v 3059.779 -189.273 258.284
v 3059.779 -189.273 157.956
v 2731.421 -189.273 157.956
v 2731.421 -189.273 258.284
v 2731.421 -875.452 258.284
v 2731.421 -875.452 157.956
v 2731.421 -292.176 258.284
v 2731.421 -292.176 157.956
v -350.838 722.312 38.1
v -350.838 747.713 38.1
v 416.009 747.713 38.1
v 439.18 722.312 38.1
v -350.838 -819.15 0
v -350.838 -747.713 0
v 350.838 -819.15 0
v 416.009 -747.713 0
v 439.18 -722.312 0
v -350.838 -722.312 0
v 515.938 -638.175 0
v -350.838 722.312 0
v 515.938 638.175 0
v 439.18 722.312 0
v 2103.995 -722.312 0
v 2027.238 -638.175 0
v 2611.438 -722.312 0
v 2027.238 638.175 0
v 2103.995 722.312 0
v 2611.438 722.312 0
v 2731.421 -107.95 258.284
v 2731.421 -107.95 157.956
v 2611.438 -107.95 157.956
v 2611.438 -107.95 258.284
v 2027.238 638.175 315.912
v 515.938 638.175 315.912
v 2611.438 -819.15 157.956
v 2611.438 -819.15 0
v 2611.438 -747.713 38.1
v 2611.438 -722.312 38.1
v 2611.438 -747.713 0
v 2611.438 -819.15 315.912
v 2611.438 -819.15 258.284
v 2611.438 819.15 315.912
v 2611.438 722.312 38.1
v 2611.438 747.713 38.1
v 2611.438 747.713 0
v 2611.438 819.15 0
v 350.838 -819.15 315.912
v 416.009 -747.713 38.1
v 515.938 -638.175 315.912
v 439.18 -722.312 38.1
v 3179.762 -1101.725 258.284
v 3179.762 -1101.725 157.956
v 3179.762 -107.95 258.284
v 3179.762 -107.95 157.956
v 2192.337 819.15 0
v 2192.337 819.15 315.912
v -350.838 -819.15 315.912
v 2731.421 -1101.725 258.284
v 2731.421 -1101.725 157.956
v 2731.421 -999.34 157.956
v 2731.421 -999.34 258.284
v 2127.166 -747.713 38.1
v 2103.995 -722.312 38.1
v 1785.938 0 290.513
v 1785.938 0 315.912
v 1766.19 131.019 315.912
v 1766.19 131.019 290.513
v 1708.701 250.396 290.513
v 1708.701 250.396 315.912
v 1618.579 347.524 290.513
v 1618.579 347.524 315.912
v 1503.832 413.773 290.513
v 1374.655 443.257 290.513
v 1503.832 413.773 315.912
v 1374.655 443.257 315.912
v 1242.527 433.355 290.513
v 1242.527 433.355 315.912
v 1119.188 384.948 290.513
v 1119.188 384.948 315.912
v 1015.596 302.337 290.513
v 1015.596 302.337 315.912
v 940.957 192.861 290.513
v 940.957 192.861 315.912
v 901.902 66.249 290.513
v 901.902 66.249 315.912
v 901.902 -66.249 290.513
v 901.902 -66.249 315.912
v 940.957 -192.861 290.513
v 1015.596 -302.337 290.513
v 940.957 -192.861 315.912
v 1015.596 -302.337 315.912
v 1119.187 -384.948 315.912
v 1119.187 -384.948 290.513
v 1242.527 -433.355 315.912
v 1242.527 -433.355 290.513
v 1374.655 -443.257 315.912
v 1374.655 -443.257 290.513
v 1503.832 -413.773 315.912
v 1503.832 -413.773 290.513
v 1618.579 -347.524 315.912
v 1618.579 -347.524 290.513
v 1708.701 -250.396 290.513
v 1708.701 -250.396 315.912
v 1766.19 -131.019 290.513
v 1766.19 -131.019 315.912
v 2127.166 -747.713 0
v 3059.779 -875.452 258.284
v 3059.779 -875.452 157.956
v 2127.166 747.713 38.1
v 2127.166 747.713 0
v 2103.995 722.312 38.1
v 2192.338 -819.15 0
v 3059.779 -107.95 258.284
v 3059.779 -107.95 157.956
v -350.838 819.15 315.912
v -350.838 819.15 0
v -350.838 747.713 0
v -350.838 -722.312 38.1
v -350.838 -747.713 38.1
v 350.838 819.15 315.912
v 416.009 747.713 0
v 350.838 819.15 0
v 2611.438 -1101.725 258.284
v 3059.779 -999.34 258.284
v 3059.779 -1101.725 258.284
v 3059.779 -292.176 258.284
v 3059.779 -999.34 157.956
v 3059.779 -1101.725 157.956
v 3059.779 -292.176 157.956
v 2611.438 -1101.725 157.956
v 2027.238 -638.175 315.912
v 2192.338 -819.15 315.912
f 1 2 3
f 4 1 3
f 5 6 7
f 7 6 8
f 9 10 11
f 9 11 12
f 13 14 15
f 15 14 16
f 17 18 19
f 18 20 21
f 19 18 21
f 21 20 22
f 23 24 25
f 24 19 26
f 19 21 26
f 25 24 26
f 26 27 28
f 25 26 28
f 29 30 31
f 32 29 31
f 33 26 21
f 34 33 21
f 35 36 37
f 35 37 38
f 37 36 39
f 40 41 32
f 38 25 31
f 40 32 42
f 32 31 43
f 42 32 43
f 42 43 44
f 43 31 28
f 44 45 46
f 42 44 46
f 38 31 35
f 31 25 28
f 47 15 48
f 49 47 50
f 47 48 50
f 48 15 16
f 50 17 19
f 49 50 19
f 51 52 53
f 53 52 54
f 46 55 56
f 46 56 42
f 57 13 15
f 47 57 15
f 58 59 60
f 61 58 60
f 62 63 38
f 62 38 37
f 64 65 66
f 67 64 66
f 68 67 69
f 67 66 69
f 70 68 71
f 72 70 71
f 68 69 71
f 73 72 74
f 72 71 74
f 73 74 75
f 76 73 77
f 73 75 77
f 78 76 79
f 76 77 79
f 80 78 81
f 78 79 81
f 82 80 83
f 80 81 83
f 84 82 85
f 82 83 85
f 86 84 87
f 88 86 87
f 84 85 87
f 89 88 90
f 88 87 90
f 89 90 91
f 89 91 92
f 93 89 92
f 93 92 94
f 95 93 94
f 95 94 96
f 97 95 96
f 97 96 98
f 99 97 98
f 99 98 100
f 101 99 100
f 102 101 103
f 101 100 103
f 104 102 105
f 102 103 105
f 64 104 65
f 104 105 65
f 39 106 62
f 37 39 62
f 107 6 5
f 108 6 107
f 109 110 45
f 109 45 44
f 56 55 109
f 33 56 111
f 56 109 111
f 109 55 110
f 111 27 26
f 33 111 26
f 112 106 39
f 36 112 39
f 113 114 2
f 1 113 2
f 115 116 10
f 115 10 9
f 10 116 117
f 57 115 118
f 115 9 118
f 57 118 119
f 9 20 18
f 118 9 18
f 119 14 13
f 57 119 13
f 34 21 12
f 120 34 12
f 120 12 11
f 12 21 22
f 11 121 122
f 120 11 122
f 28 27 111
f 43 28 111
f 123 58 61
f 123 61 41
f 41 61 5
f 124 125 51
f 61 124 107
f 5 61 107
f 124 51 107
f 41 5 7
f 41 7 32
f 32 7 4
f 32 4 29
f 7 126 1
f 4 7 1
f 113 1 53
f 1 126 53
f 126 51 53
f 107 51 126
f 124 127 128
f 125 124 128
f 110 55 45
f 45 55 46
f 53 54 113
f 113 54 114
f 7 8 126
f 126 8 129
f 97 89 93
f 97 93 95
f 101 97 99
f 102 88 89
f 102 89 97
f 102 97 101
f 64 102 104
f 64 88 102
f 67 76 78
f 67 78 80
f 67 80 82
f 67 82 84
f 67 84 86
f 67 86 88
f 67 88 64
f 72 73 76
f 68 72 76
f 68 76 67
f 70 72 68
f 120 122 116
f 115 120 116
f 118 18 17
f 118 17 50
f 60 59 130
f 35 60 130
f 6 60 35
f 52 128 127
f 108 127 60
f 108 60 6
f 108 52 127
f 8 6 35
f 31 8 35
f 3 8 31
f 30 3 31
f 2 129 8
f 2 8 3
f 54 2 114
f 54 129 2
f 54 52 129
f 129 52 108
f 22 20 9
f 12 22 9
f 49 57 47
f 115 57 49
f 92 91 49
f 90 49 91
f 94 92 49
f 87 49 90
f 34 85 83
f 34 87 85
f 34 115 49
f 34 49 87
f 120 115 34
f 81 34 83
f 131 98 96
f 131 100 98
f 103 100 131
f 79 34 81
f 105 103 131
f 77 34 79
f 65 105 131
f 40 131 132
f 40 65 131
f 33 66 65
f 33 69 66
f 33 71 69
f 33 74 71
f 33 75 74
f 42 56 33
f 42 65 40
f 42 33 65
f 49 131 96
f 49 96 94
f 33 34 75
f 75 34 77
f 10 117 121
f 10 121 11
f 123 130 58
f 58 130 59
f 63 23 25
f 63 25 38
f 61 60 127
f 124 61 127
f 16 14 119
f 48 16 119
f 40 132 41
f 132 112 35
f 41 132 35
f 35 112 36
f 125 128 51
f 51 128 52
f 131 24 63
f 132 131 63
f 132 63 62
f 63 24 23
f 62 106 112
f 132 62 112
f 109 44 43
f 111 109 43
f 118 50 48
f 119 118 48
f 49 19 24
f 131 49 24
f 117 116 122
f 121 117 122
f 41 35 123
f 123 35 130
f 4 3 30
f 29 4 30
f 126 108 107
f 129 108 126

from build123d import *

# Parameters (mm, degrees)
F0_W     = 165.1
F0_H     = 1276.35
F0_W_2   = 419.1
F0_H_2   = 180.975
F0_W_3   = 328.358334
F0_H_3   = 583.276153
F1_DEPTH = 315.9125
F3_W     = 993.775
F3_H     = 57.628408
F3_H_2   = 157.95625
F4_DEPTH = 568.325
F5_R     = 444.5
F6_DEPTH = 25.4
F7_W     = 25.4
F7_H     = 38.1
F8_DEPTH = 3530.601


with BuildPart() as f1:
    # F0 (on Top) → F1 (new body)
    with BuildSketch(Plane.XY):
        Polygon((350.8375, 819.15), (350.8375, 638.175), (515.9375, 638.175), align=None)
        Polygon((350.8375, -638.175), (350.8375, -819.15), (515.9375, -638.175), align=None)
        Polygon((350.8375, 638.175), (350.8375, -638.175), (515.9375, -638.175), (2027.2375, -638.175), (2027.2375, 638.175), (515.9375, 638.175), align=None)
        with Locations((2109.7875, 0)):
            Rectangle(F0_W, F0_H)
        with Locations((2401.8875, 728.6625)):
            Rectangle(F0_W_2, F0_H_2)
        Polygon((2192.3375, 638.175), (2192.3375, -638.175), (2611.4375, -638.175), (2611.4375, -107.95), (2611.4375, 638.175), align=None)
        Polygon((2611.4375, -638.175), (2192.3375, -638.175), (2192.3375, -732.404232), (2192.3375, -819.15), (2611.4375, -819.15), align=None)
        Polygon((2192.3375, -638.175), (2027.2375, -638.175), (2192.3375, -819.15), (2192.3375, -732.404232), align=None)
        Polygon((-350.8375, -819.15), (350.8375, -819.15), (350.8375, -638.175), (350.8375, 638.175), (350.8375, 819.15), (-350.8375, 819.15), align=None)
        Polygon((2192.3375, 819.15), (2027.2375, 638.175), (2192.3375, 638.175), align=None)
        Polygon((2611.4375, -107.95), (2611.4375, -638.175), (2611.4375, -819.15), (2611.4375, -1031.997681), (2611.4375, -1101.725), (2731.420833, -1101.725), (2731.420833, -999.339616), (3059.779167, -999.339616), (3059.779167, -1101.725), (3179.7625, -1101.725), (3179.7625, -107.95), (3059.779167, -107.95), (3059.779167, -189.272612), (2731.420833, -189.272612), (2731.420833, -107.95), align=None)
        with Locations((2895.6, -583.813607)):
            Rectangle(F0_W_3, F0_H_3, mode=Mode.SUBTRACT)
    extrude(amount=F1_DEPTH)

    # F3 (on face) → F4 (cut)
    with BuildSketch(Plane.YZ.offset(3179.7625)):
        with Locations((-604.8375, 287.098296)):
            Rectangle(F3_W, F3_H)
        with Locations((-604.8375, 78.978125)):
            Rectangle(F3_W, F3_H_2)
    extrude(amount=-F4_DEPTH, mode=Mode.SUBTRACT)

    # F5 (on face) → F6 (cut)
    with BuildSketch(Plane.XY.offset(315.9125)):
        with Locations((1341.4375, 0)):
            Circle(F5_R)
    extrude(amount=-F6_DEPTH, mode=Mode.SUBTRACT)

    # F7 (on face) → F8 (cut, through all)
    with BuildSketch(Plane(origin=(-350.8375, 0, 0), x_dir=(0, -1, 0), z_dir=(-1, 0, 0))):
        with Locations((-735.0125, 19.05)):
            Rectangle(F7_W, F7_H)
        with Locations((735.0125, 19.05)):
            Rectangle(F7_W, F7_H)
    extrude(amount=-F8_DEPTH, mode=Mode.SUBTRACT)


solid = f1.part
